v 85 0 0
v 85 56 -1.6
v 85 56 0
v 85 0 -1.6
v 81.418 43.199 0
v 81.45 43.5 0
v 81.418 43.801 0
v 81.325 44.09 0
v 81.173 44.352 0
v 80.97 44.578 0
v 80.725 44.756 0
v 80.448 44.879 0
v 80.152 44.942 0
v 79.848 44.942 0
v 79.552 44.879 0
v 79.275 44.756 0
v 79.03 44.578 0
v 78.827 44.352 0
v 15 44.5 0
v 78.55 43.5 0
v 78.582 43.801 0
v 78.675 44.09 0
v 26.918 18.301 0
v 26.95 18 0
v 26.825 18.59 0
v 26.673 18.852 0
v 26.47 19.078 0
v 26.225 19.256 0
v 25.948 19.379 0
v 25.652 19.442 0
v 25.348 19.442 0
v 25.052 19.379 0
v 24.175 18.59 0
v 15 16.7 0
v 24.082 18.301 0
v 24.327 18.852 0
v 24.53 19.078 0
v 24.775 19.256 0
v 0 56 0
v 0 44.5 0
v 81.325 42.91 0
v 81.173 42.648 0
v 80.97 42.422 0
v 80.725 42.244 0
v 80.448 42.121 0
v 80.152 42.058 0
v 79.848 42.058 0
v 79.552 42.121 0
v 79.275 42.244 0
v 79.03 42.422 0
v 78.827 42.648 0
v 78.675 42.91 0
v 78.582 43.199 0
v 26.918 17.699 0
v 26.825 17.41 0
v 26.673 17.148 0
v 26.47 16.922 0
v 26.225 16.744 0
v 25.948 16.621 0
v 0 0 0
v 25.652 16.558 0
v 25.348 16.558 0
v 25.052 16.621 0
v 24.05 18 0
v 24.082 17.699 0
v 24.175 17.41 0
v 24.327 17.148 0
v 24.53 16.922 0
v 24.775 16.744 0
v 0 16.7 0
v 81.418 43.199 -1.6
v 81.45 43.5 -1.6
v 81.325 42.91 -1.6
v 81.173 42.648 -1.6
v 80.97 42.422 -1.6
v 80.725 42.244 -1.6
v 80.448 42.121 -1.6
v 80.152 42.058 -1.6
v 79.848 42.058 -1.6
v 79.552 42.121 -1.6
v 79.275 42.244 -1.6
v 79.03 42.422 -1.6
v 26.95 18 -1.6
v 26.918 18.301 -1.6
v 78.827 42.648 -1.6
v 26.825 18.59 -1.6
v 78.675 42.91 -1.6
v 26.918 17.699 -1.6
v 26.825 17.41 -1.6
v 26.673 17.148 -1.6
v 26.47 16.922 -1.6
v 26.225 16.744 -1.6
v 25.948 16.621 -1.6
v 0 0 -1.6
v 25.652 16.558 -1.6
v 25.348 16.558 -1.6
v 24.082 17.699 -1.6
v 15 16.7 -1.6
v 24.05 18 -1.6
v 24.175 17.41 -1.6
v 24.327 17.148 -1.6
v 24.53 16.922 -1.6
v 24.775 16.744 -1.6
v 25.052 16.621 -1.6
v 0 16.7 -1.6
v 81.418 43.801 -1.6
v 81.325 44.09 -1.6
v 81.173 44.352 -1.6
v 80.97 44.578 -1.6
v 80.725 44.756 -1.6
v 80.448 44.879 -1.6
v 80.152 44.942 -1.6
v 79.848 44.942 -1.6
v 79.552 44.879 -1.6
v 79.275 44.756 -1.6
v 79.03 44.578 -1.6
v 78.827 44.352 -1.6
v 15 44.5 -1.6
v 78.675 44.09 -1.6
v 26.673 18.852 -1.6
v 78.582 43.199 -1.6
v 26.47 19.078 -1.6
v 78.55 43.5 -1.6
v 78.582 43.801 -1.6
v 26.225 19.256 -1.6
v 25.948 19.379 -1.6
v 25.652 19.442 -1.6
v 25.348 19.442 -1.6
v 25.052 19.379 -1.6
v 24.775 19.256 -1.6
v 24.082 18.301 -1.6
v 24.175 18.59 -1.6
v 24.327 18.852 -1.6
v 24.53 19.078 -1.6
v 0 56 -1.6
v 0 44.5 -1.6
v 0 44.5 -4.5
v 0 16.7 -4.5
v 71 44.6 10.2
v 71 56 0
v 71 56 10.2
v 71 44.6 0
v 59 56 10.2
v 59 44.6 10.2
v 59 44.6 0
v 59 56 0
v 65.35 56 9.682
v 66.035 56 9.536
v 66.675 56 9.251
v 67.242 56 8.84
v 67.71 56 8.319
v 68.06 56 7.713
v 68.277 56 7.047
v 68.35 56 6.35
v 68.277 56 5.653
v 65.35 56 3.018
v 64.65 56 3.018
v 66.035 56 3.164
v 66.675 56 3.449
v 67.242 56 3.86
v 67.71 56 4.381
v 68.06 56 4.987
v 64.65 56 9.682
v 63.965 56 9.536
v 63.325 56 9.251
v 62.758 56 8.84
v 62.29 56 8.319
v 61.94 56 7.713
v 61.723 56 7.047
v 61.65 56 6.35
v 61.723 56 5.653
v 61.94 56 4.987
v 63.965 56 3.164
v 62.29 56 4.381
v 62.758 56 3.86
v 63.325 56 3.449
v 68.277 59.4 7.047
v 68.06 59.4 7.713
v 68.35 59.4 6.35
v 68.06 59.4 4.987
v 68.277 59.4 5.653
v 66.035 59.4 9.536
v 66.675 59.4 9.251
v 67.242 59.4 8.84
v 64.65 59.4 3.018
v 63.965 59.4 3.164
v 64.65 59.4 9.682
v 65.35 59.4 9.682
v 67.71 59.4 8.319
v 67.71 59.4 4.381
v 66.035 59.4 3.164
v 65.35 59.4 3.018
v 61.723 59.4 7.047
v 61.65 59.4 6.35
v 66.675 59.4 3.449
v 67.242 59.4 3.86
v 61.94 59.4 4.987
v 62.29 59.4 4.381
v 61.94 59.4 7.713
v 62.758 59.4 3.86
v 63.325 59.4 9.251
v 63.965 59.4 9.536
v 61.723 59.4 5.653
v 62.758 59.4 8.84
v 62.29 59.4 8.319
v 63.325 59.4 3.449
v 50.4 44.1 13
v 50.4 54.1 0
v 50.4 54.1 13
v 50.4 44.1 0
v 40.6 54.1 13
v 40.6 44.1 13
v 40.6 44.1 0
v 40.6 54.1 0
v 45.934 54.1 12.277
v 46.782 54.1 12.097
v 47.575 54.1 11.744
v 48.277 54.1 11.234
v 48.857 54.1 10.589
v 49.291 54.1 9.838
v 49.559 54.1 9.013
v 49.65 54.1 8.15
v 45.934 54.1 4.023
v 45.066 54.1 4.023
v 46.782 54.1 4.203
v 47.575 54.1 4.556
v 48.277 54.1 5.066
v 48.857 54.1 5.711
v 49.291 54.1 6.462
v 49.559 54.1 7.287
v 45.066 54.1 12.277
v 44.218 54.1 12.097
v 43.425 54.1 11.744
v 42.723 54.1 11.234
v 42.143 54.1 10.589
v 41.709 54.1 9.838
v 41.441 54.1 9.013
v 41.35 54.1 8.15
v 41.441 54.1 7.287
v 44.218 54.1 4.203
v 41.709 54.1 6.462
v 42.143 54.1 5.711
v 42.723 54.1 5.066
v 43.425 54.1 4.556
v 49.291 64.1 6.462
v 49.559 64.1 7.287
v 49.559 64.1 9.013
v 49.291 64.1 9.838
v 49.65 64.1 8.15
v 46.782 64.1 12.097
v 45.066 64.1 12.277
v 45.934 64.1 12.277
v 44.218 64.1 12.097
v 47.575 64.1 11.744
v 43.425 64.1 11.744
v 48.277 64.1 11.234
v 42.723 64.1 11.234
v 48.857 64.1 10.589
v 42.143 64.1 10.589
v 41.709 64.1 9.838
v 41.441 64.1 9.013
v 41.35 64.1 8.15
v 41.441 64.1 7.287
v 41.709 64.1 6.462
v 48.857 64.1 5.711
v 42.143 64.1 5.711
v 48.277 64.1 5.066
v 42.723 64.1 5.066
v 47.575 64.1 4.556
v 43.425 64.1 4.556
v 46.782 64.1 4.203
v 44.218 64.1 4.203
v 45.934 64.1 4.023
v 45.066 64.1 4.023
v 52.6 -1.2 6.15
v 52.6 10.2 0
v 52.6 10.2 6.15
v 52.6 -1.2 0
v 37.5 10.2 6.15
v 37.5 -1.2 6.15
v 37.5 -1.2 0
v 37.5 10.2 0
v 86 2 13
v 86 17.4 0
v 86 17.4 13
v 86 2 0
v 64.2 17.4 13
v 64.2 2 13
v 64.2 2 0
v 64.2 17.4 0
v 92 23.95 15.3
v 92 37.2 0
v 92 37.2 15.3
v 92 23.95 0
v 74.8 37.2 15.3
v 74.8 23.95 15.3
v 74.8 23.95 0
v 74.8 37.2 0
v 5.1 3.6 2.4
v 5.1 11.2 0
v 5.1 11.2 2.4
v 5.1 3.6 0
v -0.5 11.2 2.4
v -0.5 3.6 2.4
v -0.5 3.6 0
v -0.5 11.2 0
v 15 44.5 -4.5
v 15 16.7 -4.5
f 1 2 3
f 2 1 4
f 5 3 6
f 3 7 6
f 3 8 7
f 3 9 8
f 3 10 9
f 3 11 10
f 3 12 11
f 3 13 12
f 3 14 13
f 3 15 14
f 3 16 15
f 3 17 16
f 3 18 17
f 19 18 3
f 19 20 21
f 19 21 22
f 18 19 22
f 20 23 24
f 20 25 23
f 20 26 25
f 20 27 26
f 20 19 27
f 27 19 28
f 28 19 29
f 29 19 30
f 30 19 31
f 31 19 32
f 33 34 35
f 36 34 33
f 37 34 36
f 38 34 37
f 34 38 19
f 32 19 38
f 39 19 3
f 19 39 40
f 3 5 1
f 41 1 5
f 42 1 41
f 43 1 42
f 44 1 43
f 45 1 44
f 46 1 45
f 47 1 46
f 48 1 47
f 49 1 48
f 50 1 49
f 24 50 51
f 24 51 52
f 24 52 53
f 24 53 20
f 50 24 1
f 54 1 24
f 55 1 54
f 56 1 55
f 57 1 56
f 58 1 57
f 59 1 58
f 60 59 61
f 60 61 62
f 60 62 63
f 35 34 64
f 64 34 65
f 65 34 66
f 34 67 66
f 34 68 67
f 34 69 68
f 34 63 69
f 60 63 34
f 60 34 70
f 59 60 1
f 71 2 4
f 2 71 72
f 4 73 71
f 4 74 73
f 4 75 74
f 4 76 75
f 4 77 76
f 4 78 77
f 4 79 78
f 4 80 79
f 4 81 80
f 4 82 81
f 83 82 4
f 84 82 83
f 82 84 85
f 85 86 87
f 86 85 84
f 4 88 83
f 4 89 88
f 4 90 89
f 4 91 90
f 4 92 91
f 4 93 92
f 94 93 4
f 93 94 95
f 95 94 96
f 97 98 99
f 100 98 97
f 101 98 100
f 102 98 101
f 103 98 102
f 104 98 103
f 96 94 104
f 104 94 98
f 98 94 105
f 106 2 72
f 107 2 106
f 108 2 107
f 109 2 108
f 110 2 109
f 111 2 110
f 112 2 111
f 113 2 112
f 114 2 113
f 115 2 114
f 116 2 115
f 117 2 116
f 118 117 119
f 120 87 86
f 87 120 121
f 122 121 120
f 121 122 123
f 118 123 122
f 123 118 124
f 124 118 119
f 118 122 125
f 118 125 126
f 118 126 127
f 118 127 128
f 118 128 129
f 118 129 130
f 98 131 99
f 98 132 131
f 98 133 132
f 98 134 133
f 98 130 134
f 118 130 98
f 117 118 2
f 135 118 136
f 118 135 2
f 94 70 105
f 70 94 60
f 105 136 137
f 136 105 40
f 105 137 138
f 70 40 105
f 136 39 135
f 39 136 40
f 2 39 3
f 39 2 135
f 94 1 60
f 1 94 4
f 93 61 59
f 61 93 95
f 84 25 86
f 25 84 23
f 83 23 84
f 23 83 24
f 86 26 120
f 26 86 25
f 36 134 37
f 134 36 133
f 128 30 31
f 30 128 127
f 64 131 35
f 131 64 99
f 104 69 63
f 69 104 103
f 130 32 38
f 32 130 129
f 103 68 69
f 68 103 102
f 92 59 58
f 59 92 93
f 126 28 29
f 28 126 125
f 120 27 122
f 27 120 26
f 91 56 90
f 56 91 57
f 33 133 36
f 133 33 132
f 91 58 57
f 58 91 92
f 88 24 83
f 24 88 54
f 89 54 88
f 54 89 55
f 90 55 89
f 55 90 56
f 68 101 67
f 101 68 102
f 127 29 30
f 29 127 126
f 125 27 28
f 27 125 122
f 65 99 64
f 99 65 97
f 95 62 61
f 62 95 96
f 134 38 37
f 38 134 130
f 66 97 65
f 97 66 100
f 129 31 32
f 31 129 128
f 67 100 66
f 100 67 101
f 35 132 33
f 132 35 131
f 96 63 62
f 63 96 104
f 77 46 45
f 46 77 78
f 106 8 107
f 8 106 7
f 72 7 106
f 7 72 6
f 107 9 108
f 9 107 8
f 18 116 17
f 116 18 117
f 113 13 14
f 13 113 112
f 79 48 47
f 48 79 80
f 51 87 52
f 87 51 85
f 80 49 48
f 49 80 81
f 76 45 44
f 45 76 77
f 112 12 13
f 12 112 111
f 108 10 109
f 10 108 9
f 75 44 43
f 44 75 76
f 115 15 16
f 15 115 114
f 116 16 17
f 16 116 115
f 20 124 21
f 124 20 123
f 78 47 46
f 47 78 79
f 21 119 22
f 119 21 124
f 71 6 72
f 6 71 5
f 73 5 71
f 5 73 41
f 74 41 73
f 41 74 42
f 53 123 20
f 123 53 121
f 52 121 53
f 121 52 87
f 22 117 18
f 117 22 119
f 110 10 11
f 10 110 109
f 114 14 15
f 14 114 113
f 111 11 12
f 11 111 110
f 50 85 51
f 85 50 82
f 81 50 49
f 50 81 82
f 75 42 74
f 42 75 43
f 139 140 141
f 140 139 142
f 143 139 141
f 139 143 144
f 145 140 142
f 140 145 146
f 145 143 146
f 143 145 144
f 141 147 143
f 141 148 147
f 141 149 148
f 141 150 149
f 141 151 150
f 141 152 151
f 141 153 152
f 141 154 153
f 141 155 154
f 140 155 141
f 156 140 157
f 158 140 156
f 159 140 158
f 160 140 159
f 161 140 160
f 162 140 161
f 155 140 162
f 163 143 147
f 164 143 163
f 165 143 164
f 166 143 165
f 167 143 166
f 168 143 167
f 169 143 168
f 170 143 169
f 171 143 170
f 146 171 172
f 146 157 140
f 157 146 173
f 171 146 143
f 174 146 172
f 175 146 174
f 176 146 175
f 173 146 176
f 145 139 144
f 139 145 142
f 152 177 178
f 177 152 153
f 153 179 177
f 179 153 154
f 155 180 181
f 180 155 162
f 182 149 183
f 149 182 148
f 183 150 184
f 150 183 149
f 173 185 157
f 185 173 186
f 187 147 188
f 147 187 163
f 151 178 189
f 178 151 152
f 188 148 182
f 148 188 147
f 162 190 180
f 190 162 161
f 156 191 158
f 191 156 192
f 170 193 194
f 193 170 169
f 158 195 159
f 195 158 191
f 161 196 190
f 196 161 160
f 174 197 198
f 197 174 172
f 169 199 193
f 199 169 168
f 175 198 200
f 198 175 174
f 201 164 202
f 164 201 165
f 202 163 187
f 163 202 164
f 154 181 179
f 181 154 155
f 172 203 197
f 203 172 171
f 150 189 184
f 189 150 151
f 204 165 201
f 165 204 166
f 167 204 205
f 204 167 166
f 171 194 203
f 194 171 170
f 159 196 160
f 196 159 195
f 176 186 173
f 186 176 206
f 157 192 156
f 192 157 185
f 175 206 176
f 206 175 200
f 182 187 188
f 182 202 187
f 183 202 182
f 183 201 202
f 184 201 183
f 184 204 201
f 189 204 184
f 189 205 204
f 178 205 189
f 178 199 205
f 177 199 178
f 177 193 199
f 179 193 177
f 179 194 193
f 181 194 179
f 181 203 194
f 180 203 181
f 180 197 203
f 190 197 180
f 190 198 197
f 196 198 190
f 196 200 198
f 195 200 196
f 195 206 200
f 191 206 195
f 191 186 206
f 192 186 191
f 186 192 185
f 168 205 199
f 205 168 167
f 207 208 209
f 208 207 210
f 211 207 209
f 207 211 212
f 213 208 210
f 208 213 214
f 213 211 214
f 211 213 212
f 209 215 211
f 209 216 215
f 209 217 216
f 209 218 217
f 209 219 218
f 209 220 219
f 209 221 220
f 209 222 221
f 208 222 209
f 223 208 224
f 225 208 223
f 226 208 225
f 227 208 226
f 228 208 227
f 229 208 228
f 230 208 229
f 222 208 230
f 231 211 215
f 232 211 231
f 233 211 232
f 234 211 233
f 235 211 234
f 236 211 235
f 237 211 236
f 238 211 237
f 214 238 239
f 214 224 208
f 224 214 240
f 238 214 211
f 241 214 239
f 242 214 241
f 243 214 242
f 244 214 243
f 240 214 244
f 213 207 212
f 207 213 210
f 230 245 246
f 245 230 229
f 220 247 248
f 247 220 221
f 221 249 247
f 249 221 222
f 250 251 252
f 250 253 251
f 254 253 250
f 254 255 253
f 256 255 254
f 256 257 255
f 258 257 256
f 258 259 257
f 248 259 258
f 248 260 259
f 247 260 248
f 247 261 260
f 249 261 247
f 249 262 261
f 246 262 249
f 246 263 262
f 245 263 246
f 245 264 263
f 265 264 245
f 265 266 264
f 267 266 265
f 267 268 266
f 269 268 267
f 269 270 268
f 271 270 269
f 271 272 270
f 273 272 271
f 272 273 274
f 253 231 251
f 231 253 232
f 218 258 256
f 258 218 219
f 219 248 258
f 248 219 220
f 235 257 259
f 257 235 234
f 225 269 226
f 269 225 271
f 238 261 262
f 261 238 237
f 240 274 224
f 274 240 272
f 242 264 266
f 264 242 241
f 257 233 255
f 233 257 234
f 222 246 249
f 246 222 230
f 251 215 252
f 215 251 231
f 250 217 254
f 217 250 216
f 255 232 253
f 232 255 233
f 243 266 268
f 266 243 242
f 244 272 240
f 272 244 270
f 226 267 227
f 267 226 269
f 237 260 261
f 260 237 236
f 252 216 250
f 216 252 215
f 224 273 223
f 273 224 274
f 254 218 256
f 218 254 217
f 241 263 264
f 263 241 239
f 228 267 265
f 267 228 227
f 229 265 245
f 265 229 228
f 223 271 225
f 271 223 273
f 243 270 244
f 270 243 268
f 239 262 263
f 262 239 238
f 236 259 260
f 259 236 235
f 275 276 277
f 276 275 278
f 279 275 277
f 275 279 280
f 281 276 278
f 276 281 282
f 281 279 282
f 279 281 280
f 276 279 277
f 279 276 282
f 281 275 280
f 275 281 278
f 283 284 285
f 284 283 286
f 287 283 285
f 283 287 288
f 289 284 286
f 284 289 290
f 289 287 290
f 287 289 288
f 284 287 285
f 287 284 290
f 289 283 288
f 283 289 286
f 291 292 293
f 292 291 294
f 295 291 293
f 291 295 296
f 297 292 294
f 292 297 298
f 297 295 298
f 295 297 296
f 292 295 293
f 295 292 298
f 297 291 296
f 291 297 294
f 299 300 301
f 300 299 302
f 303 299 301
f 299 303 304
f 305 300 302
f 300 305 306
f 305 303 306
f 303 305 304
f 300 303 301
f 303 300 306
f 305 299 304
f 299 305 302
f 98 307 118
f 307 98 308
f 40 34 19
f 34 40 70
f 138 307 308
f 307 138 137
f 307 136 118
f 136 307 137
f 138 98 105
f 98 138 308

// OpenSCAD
module board() {
    difference() {
        cube([85, 56, 1.6]);
        translate([25.5, 18, 0])cylinder(h = 4, d = 2.9, center = true, $fn = 30);
        translate([85 - 5, 56 - 12.5, 0])cylinder(h = 4, d = 2.9, center = true, $fn = 30);
    }
}

module hdmi() {
    cube([15.1, 11.4, 6.15]);
}

module ethernet() {
    cube([21.8, 15.4, 13]);
}

module usb() {
   cube([17.2, 13.25, 15.3]);
} 

module jack() {
    cube([12, 11.4, 10.2]);
    translate([12 / 2, 11.4 + 3.4 / 2, 3 + 6.7 / 2]) rotate([90, 0, 0])
        cylinder(h = 3.4, d = 6.7, center = true, $fn = 30);
}

module composite() {
    cube([9.8, 10, 13]);
    translate([9.8 / 2, 15, 8.3 / 2 + 4]) rotate([90, 0, 0])
        cylinder(h = 10, d = 8.3, center = true, $fn = 30);
}

module micro_usb() {
    cube([5.6, 7.6, 2.4]);
}

module sd() {
    cube([15, 27.8, 4.5]);
}

module rpi() {
    translate([0, 0, -1.6]) board();
    translate([37.5, -1.2, 0]) hdmi();
    translate([85 - 21.8 + 1, 2, 0]) ethernet();
    translate([85 - 17.2 + 7, 56 - 13.25 - 18.8, 0]) usb();
    translate([85 - 12 - 14, 56 - 11.4, 0]) jack();
    translate([40.6, 56 - 9.8 - 2.1, 0]) composite();
    translate([-0.5, 3.6, 0]) micro_usb();
    translate([0, 56 - 27.8 - 11.5, -4.5]) sd();
}

rpi();
